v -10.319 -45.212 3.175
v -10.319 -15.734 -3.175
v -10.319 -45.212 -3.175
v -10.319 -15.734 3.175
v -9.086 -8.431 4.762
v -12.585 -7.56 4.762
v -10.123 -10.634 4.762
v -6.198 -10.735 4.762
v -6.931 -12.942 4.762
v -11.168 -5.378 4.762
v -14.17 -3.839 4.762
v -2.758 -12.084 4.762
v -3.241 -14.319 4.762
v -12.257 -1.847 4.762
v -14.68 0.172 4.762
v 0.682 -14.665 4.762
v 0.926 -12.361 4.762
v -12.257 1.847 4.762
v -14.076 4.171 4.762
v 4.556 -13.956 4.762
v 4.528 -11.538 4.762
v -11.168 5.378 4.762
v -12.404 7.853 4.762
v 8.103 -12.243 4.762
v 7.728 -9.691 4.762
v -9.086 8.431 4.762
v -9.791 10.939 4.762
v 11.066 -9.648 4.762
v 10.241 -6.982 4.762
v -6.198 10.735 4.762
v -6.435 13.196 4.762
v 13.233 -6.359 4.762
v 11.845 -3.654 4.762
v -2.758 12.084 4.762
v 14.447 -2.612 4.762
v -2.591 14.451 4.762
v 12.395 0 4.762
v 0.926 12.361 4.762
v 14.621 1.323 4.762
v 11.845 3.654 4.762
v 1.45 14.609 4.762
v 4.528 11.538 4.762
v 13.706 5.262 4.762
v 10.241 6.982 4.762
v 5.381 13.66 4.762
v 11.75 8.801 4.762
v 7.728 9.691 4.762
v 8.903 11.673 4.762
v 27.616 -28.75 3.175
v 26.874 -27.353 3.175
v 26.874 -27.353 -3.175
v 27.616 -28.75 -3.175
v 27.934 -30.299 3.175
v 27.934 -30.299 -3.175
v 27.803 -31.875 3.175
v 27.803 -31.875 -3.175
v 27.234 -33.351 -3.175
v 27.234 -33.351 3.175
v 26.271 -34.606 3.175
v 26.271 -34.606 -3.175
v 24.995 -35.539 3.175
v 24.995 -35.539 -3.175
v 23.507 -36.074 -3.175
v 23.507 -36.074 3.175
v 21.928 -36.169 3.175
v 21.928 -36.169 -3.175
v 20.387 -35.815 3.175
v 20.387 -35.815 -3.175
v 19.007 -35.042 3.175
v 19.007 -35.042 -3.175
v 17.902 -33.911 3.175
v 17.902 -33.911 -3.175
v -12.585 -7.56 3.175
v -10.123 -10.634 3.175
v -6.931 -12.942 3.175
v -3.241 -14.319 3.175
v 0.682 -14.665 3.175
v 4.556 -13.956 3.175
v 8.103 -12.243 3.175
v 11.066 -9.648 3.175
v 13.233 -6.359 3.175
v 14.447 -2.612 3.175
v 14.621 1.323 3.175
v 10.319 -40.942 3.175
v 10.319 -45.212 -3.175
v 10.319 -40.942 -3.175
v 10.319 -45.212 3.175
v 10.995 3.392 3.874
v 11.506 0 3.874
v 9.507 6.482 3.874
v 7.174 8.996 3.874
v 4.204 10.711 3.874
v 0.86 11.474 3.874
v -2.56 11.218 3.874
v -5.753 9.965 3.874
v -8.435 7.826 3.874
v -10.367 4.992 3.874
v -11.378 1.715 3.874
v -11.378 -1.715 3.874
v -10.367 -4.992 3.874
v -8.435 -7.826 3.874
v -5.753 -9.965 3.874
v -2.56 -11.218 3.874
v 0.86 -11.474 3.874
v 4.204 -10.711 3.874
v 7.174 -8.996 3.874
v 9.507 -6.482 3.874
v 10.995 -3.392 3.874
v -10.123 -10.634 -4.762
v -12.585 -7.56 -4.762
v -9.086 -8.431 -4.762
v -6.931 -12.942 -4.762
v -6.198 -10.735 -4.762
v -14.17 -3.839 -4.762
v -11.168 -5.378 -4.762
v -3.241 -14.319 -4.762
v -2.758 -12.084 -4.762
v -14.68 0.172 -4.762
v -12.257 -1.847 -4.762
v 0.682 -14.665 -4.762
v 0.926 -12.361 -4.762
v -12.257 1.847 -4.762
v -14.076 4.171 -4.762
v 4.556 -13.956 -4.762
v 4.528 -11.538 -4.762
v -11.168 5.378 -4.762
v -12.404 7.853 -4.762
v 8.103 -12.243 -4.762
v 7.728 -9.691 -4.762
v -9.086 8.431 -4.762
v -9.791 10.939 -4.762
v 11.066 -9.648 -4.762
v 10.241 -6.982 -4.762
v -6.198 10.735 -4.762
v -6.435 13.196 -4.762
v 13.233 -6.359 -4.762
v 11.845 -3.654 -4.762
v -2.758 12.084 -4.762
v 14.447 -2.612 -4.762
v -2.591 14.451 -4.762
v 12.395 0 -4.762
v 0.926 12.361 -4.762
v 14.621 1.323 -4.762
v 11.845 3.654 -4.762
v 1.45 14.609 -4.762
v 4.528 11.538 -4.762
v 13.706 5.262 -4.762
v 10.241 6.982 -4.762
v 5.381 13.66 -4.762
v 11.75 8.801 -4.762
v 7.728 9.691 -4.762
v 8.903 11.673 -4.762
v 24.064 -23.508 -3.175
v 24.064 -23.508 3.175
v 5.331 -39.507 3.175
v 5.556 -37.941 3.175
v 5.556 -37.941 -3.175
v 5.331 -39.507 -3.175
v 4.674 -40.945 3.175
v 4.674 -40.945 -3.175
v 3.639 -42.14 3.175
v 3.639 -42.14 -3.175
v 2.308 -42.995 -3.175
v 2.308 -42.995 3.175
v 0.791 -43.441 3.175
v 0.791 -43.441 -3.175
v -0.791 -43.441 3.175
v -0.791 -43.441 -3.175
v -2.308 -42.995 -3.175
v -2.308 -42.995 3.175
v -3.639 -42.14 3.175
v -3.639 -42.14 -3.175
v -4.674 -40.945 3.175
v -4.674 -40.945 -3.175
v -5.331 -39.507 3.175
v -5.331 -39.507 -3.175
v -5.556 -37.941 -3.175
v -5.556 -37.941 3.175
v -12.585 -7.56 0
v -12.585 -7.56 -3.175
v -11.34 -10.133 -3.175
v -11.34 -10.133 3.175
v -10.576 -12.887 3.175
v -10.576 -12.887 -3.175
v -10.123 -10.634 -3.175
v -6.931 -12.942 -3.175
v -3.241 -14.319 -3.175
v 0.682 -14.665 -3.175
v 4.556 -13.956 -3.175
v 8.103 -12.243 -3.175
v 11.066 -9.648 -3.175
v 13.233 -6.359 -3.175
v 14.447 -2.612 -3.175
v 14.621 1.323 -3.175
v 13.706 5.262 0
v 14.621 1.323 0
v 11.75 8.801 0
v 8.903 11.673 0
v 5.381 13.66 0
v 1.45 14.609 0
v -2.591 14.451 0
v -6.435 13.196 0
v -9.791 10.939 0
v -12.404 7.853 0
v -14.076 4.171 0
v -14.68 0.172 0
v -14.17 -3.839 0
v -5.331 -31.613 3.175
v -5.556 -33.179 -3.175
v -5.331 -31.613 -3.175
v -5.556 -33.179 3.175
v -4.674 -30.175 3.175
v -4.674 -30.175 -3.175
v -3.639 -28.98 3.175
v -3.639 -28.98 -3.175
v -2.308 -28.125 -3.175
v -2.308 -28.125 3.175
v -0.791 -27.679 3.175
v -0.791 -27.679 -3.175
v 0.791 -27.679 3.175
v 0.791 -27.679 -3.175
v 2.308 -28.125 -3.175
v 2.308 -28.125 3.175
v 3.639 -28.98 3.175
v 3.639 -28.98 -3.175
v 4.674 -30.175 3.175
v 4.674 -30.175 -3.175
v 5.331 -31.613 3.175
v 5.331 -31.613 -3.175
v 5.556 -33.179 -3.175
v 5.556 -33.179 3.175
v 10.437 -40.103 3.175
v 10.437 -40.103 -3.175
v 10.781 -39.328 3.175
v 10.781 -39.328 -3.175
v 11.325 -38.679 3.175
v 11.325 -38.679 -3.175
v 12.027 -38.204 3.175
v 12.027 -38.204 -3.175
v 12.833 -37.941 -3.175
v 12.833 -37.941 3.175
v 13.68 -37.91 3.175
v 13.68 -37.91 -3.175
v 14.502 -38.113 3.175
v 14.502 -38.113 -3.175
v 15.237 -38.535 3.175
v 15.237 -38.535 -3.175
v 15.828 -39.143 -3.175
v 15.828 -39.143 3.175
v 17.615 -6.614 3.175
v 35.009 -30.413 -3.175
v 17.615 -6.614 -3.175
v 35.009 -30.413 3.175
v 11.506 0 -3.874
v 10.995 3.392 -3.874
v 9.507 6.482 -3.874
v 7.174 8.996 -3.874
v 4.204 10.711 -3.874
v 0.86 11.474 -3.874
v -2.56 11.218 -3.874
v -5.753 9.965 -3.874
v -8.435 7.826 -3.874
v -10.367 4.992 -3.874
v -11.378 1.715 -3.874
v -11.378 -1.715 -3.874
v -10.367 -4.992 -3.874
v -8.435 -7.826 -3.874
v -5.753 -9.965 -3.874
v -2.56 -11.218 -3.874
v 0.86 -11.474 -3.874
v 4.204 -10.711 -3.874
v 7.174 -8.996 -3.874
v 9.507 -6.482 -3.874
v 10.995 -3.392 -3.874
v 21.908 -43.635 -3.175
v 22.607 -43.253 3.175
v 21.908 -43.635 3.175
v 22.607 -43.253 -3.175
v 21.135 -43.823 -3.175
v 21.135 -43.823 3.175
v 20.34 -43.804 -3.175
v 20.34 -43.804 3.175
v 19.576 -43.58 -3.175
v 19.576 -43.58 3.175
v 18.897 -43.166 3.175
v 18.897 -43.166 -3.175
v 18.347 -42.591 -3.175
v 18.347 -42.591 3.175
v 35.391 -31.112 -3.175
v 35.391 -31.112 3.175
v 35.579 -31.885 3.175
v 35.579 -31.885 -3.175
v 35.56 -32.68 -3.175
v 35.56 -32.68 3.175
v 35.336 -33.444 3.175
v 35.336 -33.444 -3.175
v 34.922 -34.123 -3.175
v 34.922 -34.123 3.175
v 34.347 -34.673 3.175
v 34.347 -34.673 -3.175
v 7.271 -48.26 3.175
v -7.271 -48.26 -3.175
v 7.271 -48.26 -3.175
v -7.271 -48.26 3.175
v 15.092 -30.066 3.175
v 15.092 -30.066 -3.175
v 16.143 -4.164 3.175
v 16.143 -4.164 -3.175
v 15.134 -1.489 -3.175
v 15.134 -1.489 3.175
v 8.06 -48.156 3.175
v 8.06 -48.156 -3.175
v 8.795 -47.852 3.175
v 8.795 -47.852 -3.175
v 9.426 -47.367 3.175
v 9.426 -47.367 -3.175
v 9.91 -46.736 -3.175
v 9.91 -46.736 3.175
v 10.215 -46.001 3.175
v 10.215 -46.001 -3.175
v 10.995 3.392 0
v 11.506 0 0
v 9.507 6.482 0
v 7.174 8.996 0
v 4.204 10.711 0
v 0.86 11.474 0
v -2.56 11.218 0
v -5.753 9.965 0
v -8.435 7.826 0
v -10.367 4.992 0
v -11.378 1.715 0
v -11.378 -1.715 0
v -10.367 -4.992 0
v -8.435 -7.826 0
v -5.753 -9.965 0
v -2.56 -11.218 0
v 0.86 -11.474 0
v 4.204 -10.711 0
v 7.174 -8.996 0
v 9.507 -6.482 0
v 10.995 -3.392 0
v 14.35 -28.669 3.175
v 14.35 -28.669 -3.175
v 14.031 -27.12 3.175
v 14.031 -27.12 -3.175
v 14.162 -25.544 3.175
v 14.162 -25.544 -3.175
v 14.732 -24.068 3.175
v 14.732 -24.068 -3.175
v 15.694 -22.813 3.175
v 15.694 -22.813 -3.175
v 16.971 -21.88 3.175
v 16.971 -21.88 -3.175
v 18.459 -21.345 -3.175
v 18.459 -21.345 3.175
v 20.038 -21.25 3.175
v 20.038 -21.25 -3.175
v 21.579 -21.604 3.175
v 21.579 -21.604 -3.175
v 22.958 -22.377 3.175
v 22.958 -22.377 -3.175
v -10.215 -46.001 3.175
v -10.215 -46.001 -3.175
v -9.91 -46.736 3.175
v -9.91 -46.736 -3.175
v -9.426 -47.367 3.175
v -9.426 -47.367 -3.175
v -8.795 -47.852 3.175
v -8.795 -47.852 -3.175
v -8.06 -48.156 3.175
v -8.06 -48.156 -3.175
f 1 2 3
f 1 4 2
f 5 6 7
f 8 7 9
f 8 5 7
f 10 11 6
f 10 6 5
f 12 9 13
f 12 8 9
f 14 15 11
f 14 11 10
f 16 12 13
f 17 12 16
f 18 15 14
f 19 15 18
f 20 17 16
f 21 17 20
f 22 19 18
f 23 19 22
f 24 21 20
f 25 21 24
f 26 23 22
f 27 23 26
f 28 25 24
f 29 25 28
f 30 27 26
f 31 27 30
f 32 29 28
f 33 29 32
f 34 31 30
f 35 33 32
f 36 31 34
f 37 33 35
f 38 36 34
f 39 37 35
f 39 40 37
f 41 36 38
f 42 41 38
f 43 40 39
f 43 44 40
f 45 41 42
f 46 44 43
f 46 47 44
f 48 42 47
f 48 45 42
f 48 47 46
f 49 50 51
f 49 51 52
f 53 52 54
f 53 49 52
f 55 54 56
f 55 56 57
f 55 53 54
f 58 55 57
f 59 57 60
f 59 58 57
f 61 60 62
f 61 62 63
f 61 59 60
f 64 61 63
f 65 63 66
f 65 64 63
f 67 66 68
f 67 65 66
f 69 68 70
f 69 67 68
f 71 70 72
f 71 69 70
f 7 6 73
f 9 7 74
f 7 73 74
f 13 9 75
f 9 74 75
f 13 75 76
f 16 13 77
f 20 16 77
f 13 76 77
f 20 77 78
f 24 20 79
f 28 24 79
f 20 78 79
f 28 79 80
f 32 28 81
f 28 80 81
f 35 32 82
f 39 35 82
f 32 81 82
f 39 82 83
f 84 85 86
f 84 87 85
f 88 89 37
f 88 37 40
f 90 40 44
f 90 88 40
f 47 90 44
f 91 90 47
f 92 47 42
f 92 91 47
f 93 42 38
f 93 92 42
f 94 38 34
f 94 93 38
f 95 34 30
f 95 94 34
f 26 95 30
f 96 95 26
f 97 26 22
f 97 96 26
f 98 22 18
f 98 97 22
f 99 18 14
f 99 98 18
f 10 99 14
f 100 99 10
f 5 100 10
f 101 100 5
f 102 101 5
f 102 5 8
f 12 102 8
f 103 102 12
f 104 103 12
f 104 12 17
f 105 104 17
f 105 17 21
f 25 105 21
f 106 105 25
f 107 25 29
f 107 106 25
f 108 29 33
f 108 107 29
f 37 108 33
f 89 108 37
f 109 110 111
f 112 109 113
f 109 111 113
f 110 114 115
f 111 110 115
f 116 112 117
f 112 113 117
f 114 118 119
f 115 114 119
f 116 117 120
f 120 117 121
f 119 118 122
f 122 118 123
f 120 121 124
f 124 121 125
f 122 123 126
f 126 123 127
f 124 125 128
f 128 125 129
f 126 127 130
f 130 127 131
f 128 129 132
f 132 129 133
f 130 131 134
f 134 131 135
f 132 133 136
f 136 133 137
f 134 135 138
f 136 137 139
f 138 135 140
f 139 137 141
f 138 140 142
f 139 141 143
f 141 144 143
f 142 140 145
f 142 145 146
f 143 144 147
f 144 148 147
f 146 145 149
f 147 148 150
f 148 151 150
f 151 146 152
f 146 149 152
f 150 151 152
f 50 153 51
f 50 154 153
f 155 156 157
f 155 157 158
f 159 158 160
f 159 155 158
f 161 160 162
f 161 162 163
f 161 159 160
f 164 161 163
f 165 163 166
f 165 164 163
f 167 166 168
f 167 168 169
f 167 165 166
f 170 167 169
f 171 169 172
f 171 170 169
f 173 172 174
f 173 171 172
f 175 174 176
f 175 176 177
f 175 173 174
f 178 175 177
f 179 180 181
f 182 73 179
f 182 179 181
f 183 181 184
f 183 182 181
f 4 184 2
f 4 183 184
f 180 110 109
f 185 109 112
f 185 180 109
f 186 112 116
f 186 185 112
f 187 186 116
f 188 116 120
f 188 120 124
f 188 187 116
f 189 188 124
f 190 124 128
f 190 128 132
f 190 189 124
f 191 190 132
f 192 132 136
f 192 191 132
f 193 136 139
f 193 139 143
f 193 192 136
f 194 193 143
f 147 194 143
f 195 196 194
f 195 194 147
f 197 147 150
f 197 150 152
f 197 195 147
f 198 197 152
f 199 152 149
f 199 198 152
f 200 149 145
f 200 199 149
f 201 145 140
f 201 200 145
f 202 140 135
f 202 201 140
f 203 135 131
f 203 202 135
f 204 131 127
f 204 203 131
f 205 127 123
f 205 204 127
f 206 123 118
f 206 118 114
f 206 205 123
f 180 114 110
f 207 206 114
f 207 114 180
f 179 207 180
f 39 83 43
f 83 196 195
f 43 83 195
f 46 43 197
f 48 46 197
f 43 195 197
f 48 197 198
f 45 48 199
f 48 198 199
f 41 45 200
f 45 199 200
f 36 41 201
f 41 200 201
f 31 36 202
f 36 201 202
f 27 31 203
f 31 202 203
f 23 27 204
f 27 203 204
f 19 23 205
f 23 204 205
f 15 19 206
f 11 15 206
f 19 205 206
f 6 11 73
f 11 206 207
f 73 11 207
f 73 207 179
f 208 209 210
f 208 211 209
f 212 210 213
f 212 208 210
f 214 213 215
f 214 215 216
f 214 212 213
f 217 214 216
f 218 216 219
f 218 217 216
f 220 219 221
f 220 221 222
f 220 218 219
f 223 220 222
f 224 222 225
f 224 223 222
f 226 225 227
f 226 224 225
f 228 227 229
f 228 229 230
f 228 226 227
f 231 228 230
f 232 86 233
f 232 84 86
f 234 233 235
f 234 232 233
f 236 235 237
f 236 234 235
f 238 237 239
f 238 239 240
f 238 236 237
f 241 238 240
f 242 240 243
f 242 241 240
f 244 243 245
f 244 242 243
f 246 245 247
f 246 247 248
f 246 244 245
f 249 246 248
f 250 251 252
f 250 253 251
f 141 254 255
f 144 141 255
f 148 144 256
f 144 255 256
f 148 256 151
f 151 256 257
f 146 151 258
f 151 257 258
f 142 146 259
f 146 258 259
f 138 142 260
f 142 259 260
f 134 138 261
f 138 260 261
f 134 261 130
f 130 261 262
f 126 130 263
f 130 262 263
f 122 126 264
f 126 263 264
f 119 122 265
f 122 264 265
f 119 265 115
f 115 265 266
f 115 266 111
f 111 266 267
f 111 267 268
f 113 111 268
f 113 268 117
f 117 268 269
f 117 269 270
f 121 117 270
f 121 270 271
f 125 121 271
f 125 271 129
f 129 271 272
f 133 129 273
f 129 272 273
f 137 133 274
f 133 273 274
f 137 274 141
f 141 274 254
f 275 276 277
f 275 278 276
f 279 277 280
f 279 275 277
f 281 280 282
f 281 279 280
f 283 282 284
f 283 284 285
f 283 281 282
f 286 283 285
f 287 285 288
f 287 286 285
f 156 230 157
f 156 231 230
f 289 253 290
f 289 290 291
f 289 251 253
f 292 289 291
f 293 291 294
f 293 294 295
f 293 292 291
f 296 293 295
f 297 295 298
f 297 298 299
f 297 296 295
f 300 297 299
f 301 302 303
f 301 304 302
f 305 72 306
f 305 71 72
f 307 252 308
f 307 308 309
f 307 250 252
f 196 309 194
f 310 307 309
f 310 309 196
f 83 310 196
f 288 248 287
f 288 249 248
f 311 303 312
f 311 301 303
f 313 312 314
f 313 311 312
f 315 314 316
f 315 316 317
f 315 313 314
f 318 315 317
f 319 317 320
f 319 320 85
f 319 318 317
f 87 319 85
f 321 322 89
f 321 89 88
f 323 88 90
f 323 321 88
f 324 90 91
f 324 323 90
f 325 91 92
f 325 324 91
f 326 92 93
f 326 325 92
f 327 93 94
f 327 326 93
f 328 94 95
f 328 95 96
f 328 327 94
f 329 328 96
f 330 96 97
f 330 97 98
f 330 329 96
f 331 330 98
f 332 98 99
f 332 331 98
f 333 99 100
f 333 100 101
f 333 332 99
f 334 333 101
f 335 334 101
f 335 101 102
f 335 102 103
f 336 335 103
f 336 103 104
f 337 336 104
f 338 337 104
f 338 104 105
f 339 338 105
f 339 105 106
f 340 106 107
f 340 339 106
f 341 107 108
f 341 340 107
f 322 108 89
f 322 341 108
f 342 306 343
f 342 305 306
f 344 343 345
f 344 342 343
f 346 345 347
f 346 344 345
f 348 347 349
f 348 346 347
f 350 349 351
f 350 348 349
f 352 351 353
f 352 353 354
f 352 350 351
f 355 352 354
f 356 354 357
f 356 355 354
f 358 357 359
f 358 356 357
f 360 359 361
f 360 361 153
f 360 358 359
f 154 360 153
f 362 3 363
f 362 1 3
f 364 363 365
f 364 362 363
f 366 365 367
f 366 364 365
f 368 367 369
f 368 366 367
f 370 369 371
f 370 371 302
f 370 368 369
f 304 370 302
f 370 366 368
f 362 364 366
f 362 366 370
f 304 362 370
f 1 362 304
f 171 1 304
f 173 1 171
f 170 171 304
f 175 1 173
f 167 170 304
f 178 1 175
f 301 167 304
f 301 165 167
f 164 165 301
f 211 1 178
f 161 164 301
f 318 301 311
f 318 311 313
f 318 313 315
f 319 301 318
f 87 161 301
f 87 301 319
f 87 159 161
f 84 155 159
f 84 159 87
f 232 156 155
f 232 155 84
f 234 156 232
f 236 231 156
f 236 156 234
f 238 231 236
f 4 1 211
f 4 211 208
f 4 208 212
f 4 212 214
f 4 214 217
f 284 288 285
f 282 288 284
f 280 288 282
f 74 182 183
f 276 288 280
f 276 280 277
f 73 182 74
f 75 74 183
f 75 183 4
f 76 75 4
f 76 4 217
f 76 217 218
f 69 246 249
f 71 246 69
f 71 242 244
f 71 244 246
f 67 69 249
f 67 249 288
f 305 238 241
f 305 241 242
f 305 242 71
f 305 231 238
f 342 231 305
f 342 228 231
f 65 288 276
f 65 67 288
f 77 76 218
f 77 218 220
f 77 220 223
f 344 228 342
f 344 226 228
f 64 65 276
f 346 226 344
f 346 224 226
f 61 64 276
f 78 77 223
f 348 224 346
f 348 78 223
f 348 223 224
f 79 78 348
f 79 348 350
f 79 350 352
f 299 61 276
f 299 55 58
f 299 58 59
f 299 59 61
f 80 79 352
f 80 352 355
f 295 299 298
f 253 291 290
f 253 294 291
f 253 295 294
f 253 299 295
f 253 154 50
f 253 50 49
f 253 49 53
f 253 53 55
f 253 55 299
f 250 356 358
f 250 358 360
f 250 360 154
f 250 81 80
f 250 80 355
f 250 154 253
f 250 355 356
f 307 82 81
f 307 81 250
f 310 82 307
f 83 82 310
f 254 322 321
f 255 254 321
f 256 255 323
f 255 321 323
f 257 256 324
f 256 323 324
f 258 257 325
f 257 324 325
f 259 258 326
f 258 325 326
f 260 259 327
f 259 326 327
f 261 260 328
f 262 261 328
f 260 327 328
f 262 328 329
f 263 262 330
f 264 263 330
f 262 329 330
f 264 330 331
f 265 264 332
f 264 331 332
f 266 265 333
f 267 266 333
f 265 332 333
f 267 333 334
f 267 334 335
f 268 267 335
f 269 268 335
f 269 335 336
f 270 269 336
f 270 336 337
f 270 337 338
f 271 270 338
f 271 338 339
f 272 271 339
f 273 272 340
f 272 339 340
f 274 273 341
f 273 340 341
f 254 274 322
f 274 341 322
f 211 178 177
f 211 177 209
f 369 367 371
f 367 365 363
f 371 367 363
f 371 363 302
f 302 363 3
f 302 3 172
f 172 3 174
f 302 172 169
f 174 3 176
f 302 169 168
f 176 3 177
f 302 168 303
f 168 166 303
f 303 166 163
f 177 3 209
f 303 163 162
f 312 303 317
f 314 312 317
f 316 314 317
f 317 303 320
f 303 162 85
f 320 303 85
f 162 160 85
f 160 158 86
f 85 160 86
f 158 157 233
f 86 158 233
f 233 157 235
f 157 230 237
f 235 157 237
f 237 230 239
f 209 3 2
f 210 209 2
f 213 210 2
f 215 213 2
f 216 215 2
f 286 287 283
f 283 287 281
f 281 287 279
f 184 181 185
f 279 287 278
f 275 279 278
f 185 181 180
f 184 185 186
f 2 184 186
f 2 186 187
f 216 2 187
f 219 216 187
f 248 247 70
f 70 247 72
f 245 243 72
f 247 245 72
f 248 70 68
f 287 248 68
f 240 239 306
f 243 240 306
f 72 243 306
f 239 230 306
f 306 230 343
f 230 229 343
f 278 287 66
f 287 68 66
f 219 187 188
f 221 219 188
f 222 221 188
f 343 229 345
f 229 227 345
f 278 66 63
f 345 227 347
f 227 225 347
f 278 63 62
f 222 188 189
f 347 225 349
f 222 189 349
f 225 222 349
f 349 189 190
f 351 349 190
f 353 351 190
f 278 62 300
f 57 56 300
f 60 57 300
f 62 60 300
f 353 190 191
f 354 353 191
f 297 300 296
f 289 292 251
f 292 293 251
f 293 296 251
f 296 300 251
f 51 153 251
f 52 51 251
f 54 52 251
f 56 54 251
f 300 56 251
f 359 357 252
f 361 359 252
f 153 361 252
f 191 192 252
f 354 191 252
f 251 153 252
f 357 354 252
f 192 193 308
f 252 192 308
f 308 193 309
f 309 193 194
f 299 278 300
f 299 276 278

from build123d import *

# Parameters (mm, degrees)
SKETCH1_R           = 11.5062
BOSS_EXTRUDE2_DEPTH = 4.7625
BOSS_EXTRUDE3_DEPTH = 3.175
FILLET1_R           = 3.048
CHAMFER1_SIZE       = 0.889


with BuildPart() as part:
    # Sketch1 → Boss-Extrude2 (new body, symmetric)
    with BuildSketch(Plane.XY):
        with BuildLine():
            ThreePointArc((14.621497696, 1.322663433), (-4.556441994, 13.956234084), (-12.585193267, -7.559797873))
            ThreePointArc((-12.585193267, -7.559797873), (4.556441994, -13.956234084), (14.621497696, 1.322663433))
        make_face()
        Circle(SKETCH1_R, mode=Mode.SUBTRACT)
    extrude(amount=BOSS_EXTRUDE2_DEPTH, both=True)

    # Sketch1<4> → Boss-Extrude3 (add, symmetric)
    with BuildSketch(Plane.XY):
        with BuildLine():
            ThreePointArc((-12.585193267, -7.559797873), (-10.89585042, -11.492870345), (-10.31875, -15.734319794))
            Line((-10.31875, -15.734319794), (-10.31875, -48.26))
            Line((-10.31875, -48.26), (10.31875, -48.26))
            Line((10.31875, -48.26), (10.31875, -31.605996662))
            Line((10.31875, -31.605996662), (20.145719857, -45.051683354))
            Line((20.145719857, -45.051683354), (36.80750102, -32.874185469))
            Line((36.80750102, -32.874185469), (17.615185966, -6.614426983))
            ThreePointArc((17.615185966, -6.614426983), (15.578373329, -2.849545496), (14.621497696, 1.322663433))
            ThreePointArc((14.621497696, 1.322663433), (4.556441994, -13.956234084), (-12.585193267, -7.559797873))
        make_face()
        with BuildLine():
            ThreePointArc((5.55625, -37.94125), (0, -43.4975), (-5.55625, -37.94125))
            Line((-5.55625, -37.94125), (-5.55625, -33.17875))
            ThreePointArc((-5.55625, -33.17875), (0, -27.6225), (5.55625, -33.17875))
            Line((5.55625, -33.17875), (5.55625, -37.94125))
        make_face(mode=Mode.SUBTRACT)
        with BuildLine():
            ThreePointArc((26.873725655, -27.353486707), (25.666418619, -35.117907989), (17.901997337, -33.910600953))
            Line((17.901997337, -33.910600953), (15.091805517, -30.065574531))
            ThreePointArc((15.091805517, -30.065574531), (16.299112553, -22.301153249), (24.063533835, -23.508460285))
            Line((24.063533835, -23.508460285), (26.873725655, -27.353486707))
        make_face(mode=Mode.SUBTRACT)
    extrude(amount=BOSS_EXTRUDE3_DEPTH, both=True)

    # Fillet1
    fillet1_edges = [part.edges().sort_by_distance(p)[0] for p in [
        (-10.31875, -48.26, 0),
        (10.31875, -48.26, 0),
        (10.31875, -31.605996662, 0),
        (20.145719857, -45.051683354, 0),
        (36.80750102, -32.874185469, 0),
    ]]
    fillet(fillet1_edges, radius=FILLET1_R)

    # Chamfer1
    chamfer1_edges = [part.edges().sort_by_distance(p)[0] for p in [
        (-11.5062, 0, -4.7625),
        (-11.5062, 0, 4.7625),
    ]]
    chamfer(chamfer1_edges, length=CHAMFER1_SIZE)


solid = part.part
